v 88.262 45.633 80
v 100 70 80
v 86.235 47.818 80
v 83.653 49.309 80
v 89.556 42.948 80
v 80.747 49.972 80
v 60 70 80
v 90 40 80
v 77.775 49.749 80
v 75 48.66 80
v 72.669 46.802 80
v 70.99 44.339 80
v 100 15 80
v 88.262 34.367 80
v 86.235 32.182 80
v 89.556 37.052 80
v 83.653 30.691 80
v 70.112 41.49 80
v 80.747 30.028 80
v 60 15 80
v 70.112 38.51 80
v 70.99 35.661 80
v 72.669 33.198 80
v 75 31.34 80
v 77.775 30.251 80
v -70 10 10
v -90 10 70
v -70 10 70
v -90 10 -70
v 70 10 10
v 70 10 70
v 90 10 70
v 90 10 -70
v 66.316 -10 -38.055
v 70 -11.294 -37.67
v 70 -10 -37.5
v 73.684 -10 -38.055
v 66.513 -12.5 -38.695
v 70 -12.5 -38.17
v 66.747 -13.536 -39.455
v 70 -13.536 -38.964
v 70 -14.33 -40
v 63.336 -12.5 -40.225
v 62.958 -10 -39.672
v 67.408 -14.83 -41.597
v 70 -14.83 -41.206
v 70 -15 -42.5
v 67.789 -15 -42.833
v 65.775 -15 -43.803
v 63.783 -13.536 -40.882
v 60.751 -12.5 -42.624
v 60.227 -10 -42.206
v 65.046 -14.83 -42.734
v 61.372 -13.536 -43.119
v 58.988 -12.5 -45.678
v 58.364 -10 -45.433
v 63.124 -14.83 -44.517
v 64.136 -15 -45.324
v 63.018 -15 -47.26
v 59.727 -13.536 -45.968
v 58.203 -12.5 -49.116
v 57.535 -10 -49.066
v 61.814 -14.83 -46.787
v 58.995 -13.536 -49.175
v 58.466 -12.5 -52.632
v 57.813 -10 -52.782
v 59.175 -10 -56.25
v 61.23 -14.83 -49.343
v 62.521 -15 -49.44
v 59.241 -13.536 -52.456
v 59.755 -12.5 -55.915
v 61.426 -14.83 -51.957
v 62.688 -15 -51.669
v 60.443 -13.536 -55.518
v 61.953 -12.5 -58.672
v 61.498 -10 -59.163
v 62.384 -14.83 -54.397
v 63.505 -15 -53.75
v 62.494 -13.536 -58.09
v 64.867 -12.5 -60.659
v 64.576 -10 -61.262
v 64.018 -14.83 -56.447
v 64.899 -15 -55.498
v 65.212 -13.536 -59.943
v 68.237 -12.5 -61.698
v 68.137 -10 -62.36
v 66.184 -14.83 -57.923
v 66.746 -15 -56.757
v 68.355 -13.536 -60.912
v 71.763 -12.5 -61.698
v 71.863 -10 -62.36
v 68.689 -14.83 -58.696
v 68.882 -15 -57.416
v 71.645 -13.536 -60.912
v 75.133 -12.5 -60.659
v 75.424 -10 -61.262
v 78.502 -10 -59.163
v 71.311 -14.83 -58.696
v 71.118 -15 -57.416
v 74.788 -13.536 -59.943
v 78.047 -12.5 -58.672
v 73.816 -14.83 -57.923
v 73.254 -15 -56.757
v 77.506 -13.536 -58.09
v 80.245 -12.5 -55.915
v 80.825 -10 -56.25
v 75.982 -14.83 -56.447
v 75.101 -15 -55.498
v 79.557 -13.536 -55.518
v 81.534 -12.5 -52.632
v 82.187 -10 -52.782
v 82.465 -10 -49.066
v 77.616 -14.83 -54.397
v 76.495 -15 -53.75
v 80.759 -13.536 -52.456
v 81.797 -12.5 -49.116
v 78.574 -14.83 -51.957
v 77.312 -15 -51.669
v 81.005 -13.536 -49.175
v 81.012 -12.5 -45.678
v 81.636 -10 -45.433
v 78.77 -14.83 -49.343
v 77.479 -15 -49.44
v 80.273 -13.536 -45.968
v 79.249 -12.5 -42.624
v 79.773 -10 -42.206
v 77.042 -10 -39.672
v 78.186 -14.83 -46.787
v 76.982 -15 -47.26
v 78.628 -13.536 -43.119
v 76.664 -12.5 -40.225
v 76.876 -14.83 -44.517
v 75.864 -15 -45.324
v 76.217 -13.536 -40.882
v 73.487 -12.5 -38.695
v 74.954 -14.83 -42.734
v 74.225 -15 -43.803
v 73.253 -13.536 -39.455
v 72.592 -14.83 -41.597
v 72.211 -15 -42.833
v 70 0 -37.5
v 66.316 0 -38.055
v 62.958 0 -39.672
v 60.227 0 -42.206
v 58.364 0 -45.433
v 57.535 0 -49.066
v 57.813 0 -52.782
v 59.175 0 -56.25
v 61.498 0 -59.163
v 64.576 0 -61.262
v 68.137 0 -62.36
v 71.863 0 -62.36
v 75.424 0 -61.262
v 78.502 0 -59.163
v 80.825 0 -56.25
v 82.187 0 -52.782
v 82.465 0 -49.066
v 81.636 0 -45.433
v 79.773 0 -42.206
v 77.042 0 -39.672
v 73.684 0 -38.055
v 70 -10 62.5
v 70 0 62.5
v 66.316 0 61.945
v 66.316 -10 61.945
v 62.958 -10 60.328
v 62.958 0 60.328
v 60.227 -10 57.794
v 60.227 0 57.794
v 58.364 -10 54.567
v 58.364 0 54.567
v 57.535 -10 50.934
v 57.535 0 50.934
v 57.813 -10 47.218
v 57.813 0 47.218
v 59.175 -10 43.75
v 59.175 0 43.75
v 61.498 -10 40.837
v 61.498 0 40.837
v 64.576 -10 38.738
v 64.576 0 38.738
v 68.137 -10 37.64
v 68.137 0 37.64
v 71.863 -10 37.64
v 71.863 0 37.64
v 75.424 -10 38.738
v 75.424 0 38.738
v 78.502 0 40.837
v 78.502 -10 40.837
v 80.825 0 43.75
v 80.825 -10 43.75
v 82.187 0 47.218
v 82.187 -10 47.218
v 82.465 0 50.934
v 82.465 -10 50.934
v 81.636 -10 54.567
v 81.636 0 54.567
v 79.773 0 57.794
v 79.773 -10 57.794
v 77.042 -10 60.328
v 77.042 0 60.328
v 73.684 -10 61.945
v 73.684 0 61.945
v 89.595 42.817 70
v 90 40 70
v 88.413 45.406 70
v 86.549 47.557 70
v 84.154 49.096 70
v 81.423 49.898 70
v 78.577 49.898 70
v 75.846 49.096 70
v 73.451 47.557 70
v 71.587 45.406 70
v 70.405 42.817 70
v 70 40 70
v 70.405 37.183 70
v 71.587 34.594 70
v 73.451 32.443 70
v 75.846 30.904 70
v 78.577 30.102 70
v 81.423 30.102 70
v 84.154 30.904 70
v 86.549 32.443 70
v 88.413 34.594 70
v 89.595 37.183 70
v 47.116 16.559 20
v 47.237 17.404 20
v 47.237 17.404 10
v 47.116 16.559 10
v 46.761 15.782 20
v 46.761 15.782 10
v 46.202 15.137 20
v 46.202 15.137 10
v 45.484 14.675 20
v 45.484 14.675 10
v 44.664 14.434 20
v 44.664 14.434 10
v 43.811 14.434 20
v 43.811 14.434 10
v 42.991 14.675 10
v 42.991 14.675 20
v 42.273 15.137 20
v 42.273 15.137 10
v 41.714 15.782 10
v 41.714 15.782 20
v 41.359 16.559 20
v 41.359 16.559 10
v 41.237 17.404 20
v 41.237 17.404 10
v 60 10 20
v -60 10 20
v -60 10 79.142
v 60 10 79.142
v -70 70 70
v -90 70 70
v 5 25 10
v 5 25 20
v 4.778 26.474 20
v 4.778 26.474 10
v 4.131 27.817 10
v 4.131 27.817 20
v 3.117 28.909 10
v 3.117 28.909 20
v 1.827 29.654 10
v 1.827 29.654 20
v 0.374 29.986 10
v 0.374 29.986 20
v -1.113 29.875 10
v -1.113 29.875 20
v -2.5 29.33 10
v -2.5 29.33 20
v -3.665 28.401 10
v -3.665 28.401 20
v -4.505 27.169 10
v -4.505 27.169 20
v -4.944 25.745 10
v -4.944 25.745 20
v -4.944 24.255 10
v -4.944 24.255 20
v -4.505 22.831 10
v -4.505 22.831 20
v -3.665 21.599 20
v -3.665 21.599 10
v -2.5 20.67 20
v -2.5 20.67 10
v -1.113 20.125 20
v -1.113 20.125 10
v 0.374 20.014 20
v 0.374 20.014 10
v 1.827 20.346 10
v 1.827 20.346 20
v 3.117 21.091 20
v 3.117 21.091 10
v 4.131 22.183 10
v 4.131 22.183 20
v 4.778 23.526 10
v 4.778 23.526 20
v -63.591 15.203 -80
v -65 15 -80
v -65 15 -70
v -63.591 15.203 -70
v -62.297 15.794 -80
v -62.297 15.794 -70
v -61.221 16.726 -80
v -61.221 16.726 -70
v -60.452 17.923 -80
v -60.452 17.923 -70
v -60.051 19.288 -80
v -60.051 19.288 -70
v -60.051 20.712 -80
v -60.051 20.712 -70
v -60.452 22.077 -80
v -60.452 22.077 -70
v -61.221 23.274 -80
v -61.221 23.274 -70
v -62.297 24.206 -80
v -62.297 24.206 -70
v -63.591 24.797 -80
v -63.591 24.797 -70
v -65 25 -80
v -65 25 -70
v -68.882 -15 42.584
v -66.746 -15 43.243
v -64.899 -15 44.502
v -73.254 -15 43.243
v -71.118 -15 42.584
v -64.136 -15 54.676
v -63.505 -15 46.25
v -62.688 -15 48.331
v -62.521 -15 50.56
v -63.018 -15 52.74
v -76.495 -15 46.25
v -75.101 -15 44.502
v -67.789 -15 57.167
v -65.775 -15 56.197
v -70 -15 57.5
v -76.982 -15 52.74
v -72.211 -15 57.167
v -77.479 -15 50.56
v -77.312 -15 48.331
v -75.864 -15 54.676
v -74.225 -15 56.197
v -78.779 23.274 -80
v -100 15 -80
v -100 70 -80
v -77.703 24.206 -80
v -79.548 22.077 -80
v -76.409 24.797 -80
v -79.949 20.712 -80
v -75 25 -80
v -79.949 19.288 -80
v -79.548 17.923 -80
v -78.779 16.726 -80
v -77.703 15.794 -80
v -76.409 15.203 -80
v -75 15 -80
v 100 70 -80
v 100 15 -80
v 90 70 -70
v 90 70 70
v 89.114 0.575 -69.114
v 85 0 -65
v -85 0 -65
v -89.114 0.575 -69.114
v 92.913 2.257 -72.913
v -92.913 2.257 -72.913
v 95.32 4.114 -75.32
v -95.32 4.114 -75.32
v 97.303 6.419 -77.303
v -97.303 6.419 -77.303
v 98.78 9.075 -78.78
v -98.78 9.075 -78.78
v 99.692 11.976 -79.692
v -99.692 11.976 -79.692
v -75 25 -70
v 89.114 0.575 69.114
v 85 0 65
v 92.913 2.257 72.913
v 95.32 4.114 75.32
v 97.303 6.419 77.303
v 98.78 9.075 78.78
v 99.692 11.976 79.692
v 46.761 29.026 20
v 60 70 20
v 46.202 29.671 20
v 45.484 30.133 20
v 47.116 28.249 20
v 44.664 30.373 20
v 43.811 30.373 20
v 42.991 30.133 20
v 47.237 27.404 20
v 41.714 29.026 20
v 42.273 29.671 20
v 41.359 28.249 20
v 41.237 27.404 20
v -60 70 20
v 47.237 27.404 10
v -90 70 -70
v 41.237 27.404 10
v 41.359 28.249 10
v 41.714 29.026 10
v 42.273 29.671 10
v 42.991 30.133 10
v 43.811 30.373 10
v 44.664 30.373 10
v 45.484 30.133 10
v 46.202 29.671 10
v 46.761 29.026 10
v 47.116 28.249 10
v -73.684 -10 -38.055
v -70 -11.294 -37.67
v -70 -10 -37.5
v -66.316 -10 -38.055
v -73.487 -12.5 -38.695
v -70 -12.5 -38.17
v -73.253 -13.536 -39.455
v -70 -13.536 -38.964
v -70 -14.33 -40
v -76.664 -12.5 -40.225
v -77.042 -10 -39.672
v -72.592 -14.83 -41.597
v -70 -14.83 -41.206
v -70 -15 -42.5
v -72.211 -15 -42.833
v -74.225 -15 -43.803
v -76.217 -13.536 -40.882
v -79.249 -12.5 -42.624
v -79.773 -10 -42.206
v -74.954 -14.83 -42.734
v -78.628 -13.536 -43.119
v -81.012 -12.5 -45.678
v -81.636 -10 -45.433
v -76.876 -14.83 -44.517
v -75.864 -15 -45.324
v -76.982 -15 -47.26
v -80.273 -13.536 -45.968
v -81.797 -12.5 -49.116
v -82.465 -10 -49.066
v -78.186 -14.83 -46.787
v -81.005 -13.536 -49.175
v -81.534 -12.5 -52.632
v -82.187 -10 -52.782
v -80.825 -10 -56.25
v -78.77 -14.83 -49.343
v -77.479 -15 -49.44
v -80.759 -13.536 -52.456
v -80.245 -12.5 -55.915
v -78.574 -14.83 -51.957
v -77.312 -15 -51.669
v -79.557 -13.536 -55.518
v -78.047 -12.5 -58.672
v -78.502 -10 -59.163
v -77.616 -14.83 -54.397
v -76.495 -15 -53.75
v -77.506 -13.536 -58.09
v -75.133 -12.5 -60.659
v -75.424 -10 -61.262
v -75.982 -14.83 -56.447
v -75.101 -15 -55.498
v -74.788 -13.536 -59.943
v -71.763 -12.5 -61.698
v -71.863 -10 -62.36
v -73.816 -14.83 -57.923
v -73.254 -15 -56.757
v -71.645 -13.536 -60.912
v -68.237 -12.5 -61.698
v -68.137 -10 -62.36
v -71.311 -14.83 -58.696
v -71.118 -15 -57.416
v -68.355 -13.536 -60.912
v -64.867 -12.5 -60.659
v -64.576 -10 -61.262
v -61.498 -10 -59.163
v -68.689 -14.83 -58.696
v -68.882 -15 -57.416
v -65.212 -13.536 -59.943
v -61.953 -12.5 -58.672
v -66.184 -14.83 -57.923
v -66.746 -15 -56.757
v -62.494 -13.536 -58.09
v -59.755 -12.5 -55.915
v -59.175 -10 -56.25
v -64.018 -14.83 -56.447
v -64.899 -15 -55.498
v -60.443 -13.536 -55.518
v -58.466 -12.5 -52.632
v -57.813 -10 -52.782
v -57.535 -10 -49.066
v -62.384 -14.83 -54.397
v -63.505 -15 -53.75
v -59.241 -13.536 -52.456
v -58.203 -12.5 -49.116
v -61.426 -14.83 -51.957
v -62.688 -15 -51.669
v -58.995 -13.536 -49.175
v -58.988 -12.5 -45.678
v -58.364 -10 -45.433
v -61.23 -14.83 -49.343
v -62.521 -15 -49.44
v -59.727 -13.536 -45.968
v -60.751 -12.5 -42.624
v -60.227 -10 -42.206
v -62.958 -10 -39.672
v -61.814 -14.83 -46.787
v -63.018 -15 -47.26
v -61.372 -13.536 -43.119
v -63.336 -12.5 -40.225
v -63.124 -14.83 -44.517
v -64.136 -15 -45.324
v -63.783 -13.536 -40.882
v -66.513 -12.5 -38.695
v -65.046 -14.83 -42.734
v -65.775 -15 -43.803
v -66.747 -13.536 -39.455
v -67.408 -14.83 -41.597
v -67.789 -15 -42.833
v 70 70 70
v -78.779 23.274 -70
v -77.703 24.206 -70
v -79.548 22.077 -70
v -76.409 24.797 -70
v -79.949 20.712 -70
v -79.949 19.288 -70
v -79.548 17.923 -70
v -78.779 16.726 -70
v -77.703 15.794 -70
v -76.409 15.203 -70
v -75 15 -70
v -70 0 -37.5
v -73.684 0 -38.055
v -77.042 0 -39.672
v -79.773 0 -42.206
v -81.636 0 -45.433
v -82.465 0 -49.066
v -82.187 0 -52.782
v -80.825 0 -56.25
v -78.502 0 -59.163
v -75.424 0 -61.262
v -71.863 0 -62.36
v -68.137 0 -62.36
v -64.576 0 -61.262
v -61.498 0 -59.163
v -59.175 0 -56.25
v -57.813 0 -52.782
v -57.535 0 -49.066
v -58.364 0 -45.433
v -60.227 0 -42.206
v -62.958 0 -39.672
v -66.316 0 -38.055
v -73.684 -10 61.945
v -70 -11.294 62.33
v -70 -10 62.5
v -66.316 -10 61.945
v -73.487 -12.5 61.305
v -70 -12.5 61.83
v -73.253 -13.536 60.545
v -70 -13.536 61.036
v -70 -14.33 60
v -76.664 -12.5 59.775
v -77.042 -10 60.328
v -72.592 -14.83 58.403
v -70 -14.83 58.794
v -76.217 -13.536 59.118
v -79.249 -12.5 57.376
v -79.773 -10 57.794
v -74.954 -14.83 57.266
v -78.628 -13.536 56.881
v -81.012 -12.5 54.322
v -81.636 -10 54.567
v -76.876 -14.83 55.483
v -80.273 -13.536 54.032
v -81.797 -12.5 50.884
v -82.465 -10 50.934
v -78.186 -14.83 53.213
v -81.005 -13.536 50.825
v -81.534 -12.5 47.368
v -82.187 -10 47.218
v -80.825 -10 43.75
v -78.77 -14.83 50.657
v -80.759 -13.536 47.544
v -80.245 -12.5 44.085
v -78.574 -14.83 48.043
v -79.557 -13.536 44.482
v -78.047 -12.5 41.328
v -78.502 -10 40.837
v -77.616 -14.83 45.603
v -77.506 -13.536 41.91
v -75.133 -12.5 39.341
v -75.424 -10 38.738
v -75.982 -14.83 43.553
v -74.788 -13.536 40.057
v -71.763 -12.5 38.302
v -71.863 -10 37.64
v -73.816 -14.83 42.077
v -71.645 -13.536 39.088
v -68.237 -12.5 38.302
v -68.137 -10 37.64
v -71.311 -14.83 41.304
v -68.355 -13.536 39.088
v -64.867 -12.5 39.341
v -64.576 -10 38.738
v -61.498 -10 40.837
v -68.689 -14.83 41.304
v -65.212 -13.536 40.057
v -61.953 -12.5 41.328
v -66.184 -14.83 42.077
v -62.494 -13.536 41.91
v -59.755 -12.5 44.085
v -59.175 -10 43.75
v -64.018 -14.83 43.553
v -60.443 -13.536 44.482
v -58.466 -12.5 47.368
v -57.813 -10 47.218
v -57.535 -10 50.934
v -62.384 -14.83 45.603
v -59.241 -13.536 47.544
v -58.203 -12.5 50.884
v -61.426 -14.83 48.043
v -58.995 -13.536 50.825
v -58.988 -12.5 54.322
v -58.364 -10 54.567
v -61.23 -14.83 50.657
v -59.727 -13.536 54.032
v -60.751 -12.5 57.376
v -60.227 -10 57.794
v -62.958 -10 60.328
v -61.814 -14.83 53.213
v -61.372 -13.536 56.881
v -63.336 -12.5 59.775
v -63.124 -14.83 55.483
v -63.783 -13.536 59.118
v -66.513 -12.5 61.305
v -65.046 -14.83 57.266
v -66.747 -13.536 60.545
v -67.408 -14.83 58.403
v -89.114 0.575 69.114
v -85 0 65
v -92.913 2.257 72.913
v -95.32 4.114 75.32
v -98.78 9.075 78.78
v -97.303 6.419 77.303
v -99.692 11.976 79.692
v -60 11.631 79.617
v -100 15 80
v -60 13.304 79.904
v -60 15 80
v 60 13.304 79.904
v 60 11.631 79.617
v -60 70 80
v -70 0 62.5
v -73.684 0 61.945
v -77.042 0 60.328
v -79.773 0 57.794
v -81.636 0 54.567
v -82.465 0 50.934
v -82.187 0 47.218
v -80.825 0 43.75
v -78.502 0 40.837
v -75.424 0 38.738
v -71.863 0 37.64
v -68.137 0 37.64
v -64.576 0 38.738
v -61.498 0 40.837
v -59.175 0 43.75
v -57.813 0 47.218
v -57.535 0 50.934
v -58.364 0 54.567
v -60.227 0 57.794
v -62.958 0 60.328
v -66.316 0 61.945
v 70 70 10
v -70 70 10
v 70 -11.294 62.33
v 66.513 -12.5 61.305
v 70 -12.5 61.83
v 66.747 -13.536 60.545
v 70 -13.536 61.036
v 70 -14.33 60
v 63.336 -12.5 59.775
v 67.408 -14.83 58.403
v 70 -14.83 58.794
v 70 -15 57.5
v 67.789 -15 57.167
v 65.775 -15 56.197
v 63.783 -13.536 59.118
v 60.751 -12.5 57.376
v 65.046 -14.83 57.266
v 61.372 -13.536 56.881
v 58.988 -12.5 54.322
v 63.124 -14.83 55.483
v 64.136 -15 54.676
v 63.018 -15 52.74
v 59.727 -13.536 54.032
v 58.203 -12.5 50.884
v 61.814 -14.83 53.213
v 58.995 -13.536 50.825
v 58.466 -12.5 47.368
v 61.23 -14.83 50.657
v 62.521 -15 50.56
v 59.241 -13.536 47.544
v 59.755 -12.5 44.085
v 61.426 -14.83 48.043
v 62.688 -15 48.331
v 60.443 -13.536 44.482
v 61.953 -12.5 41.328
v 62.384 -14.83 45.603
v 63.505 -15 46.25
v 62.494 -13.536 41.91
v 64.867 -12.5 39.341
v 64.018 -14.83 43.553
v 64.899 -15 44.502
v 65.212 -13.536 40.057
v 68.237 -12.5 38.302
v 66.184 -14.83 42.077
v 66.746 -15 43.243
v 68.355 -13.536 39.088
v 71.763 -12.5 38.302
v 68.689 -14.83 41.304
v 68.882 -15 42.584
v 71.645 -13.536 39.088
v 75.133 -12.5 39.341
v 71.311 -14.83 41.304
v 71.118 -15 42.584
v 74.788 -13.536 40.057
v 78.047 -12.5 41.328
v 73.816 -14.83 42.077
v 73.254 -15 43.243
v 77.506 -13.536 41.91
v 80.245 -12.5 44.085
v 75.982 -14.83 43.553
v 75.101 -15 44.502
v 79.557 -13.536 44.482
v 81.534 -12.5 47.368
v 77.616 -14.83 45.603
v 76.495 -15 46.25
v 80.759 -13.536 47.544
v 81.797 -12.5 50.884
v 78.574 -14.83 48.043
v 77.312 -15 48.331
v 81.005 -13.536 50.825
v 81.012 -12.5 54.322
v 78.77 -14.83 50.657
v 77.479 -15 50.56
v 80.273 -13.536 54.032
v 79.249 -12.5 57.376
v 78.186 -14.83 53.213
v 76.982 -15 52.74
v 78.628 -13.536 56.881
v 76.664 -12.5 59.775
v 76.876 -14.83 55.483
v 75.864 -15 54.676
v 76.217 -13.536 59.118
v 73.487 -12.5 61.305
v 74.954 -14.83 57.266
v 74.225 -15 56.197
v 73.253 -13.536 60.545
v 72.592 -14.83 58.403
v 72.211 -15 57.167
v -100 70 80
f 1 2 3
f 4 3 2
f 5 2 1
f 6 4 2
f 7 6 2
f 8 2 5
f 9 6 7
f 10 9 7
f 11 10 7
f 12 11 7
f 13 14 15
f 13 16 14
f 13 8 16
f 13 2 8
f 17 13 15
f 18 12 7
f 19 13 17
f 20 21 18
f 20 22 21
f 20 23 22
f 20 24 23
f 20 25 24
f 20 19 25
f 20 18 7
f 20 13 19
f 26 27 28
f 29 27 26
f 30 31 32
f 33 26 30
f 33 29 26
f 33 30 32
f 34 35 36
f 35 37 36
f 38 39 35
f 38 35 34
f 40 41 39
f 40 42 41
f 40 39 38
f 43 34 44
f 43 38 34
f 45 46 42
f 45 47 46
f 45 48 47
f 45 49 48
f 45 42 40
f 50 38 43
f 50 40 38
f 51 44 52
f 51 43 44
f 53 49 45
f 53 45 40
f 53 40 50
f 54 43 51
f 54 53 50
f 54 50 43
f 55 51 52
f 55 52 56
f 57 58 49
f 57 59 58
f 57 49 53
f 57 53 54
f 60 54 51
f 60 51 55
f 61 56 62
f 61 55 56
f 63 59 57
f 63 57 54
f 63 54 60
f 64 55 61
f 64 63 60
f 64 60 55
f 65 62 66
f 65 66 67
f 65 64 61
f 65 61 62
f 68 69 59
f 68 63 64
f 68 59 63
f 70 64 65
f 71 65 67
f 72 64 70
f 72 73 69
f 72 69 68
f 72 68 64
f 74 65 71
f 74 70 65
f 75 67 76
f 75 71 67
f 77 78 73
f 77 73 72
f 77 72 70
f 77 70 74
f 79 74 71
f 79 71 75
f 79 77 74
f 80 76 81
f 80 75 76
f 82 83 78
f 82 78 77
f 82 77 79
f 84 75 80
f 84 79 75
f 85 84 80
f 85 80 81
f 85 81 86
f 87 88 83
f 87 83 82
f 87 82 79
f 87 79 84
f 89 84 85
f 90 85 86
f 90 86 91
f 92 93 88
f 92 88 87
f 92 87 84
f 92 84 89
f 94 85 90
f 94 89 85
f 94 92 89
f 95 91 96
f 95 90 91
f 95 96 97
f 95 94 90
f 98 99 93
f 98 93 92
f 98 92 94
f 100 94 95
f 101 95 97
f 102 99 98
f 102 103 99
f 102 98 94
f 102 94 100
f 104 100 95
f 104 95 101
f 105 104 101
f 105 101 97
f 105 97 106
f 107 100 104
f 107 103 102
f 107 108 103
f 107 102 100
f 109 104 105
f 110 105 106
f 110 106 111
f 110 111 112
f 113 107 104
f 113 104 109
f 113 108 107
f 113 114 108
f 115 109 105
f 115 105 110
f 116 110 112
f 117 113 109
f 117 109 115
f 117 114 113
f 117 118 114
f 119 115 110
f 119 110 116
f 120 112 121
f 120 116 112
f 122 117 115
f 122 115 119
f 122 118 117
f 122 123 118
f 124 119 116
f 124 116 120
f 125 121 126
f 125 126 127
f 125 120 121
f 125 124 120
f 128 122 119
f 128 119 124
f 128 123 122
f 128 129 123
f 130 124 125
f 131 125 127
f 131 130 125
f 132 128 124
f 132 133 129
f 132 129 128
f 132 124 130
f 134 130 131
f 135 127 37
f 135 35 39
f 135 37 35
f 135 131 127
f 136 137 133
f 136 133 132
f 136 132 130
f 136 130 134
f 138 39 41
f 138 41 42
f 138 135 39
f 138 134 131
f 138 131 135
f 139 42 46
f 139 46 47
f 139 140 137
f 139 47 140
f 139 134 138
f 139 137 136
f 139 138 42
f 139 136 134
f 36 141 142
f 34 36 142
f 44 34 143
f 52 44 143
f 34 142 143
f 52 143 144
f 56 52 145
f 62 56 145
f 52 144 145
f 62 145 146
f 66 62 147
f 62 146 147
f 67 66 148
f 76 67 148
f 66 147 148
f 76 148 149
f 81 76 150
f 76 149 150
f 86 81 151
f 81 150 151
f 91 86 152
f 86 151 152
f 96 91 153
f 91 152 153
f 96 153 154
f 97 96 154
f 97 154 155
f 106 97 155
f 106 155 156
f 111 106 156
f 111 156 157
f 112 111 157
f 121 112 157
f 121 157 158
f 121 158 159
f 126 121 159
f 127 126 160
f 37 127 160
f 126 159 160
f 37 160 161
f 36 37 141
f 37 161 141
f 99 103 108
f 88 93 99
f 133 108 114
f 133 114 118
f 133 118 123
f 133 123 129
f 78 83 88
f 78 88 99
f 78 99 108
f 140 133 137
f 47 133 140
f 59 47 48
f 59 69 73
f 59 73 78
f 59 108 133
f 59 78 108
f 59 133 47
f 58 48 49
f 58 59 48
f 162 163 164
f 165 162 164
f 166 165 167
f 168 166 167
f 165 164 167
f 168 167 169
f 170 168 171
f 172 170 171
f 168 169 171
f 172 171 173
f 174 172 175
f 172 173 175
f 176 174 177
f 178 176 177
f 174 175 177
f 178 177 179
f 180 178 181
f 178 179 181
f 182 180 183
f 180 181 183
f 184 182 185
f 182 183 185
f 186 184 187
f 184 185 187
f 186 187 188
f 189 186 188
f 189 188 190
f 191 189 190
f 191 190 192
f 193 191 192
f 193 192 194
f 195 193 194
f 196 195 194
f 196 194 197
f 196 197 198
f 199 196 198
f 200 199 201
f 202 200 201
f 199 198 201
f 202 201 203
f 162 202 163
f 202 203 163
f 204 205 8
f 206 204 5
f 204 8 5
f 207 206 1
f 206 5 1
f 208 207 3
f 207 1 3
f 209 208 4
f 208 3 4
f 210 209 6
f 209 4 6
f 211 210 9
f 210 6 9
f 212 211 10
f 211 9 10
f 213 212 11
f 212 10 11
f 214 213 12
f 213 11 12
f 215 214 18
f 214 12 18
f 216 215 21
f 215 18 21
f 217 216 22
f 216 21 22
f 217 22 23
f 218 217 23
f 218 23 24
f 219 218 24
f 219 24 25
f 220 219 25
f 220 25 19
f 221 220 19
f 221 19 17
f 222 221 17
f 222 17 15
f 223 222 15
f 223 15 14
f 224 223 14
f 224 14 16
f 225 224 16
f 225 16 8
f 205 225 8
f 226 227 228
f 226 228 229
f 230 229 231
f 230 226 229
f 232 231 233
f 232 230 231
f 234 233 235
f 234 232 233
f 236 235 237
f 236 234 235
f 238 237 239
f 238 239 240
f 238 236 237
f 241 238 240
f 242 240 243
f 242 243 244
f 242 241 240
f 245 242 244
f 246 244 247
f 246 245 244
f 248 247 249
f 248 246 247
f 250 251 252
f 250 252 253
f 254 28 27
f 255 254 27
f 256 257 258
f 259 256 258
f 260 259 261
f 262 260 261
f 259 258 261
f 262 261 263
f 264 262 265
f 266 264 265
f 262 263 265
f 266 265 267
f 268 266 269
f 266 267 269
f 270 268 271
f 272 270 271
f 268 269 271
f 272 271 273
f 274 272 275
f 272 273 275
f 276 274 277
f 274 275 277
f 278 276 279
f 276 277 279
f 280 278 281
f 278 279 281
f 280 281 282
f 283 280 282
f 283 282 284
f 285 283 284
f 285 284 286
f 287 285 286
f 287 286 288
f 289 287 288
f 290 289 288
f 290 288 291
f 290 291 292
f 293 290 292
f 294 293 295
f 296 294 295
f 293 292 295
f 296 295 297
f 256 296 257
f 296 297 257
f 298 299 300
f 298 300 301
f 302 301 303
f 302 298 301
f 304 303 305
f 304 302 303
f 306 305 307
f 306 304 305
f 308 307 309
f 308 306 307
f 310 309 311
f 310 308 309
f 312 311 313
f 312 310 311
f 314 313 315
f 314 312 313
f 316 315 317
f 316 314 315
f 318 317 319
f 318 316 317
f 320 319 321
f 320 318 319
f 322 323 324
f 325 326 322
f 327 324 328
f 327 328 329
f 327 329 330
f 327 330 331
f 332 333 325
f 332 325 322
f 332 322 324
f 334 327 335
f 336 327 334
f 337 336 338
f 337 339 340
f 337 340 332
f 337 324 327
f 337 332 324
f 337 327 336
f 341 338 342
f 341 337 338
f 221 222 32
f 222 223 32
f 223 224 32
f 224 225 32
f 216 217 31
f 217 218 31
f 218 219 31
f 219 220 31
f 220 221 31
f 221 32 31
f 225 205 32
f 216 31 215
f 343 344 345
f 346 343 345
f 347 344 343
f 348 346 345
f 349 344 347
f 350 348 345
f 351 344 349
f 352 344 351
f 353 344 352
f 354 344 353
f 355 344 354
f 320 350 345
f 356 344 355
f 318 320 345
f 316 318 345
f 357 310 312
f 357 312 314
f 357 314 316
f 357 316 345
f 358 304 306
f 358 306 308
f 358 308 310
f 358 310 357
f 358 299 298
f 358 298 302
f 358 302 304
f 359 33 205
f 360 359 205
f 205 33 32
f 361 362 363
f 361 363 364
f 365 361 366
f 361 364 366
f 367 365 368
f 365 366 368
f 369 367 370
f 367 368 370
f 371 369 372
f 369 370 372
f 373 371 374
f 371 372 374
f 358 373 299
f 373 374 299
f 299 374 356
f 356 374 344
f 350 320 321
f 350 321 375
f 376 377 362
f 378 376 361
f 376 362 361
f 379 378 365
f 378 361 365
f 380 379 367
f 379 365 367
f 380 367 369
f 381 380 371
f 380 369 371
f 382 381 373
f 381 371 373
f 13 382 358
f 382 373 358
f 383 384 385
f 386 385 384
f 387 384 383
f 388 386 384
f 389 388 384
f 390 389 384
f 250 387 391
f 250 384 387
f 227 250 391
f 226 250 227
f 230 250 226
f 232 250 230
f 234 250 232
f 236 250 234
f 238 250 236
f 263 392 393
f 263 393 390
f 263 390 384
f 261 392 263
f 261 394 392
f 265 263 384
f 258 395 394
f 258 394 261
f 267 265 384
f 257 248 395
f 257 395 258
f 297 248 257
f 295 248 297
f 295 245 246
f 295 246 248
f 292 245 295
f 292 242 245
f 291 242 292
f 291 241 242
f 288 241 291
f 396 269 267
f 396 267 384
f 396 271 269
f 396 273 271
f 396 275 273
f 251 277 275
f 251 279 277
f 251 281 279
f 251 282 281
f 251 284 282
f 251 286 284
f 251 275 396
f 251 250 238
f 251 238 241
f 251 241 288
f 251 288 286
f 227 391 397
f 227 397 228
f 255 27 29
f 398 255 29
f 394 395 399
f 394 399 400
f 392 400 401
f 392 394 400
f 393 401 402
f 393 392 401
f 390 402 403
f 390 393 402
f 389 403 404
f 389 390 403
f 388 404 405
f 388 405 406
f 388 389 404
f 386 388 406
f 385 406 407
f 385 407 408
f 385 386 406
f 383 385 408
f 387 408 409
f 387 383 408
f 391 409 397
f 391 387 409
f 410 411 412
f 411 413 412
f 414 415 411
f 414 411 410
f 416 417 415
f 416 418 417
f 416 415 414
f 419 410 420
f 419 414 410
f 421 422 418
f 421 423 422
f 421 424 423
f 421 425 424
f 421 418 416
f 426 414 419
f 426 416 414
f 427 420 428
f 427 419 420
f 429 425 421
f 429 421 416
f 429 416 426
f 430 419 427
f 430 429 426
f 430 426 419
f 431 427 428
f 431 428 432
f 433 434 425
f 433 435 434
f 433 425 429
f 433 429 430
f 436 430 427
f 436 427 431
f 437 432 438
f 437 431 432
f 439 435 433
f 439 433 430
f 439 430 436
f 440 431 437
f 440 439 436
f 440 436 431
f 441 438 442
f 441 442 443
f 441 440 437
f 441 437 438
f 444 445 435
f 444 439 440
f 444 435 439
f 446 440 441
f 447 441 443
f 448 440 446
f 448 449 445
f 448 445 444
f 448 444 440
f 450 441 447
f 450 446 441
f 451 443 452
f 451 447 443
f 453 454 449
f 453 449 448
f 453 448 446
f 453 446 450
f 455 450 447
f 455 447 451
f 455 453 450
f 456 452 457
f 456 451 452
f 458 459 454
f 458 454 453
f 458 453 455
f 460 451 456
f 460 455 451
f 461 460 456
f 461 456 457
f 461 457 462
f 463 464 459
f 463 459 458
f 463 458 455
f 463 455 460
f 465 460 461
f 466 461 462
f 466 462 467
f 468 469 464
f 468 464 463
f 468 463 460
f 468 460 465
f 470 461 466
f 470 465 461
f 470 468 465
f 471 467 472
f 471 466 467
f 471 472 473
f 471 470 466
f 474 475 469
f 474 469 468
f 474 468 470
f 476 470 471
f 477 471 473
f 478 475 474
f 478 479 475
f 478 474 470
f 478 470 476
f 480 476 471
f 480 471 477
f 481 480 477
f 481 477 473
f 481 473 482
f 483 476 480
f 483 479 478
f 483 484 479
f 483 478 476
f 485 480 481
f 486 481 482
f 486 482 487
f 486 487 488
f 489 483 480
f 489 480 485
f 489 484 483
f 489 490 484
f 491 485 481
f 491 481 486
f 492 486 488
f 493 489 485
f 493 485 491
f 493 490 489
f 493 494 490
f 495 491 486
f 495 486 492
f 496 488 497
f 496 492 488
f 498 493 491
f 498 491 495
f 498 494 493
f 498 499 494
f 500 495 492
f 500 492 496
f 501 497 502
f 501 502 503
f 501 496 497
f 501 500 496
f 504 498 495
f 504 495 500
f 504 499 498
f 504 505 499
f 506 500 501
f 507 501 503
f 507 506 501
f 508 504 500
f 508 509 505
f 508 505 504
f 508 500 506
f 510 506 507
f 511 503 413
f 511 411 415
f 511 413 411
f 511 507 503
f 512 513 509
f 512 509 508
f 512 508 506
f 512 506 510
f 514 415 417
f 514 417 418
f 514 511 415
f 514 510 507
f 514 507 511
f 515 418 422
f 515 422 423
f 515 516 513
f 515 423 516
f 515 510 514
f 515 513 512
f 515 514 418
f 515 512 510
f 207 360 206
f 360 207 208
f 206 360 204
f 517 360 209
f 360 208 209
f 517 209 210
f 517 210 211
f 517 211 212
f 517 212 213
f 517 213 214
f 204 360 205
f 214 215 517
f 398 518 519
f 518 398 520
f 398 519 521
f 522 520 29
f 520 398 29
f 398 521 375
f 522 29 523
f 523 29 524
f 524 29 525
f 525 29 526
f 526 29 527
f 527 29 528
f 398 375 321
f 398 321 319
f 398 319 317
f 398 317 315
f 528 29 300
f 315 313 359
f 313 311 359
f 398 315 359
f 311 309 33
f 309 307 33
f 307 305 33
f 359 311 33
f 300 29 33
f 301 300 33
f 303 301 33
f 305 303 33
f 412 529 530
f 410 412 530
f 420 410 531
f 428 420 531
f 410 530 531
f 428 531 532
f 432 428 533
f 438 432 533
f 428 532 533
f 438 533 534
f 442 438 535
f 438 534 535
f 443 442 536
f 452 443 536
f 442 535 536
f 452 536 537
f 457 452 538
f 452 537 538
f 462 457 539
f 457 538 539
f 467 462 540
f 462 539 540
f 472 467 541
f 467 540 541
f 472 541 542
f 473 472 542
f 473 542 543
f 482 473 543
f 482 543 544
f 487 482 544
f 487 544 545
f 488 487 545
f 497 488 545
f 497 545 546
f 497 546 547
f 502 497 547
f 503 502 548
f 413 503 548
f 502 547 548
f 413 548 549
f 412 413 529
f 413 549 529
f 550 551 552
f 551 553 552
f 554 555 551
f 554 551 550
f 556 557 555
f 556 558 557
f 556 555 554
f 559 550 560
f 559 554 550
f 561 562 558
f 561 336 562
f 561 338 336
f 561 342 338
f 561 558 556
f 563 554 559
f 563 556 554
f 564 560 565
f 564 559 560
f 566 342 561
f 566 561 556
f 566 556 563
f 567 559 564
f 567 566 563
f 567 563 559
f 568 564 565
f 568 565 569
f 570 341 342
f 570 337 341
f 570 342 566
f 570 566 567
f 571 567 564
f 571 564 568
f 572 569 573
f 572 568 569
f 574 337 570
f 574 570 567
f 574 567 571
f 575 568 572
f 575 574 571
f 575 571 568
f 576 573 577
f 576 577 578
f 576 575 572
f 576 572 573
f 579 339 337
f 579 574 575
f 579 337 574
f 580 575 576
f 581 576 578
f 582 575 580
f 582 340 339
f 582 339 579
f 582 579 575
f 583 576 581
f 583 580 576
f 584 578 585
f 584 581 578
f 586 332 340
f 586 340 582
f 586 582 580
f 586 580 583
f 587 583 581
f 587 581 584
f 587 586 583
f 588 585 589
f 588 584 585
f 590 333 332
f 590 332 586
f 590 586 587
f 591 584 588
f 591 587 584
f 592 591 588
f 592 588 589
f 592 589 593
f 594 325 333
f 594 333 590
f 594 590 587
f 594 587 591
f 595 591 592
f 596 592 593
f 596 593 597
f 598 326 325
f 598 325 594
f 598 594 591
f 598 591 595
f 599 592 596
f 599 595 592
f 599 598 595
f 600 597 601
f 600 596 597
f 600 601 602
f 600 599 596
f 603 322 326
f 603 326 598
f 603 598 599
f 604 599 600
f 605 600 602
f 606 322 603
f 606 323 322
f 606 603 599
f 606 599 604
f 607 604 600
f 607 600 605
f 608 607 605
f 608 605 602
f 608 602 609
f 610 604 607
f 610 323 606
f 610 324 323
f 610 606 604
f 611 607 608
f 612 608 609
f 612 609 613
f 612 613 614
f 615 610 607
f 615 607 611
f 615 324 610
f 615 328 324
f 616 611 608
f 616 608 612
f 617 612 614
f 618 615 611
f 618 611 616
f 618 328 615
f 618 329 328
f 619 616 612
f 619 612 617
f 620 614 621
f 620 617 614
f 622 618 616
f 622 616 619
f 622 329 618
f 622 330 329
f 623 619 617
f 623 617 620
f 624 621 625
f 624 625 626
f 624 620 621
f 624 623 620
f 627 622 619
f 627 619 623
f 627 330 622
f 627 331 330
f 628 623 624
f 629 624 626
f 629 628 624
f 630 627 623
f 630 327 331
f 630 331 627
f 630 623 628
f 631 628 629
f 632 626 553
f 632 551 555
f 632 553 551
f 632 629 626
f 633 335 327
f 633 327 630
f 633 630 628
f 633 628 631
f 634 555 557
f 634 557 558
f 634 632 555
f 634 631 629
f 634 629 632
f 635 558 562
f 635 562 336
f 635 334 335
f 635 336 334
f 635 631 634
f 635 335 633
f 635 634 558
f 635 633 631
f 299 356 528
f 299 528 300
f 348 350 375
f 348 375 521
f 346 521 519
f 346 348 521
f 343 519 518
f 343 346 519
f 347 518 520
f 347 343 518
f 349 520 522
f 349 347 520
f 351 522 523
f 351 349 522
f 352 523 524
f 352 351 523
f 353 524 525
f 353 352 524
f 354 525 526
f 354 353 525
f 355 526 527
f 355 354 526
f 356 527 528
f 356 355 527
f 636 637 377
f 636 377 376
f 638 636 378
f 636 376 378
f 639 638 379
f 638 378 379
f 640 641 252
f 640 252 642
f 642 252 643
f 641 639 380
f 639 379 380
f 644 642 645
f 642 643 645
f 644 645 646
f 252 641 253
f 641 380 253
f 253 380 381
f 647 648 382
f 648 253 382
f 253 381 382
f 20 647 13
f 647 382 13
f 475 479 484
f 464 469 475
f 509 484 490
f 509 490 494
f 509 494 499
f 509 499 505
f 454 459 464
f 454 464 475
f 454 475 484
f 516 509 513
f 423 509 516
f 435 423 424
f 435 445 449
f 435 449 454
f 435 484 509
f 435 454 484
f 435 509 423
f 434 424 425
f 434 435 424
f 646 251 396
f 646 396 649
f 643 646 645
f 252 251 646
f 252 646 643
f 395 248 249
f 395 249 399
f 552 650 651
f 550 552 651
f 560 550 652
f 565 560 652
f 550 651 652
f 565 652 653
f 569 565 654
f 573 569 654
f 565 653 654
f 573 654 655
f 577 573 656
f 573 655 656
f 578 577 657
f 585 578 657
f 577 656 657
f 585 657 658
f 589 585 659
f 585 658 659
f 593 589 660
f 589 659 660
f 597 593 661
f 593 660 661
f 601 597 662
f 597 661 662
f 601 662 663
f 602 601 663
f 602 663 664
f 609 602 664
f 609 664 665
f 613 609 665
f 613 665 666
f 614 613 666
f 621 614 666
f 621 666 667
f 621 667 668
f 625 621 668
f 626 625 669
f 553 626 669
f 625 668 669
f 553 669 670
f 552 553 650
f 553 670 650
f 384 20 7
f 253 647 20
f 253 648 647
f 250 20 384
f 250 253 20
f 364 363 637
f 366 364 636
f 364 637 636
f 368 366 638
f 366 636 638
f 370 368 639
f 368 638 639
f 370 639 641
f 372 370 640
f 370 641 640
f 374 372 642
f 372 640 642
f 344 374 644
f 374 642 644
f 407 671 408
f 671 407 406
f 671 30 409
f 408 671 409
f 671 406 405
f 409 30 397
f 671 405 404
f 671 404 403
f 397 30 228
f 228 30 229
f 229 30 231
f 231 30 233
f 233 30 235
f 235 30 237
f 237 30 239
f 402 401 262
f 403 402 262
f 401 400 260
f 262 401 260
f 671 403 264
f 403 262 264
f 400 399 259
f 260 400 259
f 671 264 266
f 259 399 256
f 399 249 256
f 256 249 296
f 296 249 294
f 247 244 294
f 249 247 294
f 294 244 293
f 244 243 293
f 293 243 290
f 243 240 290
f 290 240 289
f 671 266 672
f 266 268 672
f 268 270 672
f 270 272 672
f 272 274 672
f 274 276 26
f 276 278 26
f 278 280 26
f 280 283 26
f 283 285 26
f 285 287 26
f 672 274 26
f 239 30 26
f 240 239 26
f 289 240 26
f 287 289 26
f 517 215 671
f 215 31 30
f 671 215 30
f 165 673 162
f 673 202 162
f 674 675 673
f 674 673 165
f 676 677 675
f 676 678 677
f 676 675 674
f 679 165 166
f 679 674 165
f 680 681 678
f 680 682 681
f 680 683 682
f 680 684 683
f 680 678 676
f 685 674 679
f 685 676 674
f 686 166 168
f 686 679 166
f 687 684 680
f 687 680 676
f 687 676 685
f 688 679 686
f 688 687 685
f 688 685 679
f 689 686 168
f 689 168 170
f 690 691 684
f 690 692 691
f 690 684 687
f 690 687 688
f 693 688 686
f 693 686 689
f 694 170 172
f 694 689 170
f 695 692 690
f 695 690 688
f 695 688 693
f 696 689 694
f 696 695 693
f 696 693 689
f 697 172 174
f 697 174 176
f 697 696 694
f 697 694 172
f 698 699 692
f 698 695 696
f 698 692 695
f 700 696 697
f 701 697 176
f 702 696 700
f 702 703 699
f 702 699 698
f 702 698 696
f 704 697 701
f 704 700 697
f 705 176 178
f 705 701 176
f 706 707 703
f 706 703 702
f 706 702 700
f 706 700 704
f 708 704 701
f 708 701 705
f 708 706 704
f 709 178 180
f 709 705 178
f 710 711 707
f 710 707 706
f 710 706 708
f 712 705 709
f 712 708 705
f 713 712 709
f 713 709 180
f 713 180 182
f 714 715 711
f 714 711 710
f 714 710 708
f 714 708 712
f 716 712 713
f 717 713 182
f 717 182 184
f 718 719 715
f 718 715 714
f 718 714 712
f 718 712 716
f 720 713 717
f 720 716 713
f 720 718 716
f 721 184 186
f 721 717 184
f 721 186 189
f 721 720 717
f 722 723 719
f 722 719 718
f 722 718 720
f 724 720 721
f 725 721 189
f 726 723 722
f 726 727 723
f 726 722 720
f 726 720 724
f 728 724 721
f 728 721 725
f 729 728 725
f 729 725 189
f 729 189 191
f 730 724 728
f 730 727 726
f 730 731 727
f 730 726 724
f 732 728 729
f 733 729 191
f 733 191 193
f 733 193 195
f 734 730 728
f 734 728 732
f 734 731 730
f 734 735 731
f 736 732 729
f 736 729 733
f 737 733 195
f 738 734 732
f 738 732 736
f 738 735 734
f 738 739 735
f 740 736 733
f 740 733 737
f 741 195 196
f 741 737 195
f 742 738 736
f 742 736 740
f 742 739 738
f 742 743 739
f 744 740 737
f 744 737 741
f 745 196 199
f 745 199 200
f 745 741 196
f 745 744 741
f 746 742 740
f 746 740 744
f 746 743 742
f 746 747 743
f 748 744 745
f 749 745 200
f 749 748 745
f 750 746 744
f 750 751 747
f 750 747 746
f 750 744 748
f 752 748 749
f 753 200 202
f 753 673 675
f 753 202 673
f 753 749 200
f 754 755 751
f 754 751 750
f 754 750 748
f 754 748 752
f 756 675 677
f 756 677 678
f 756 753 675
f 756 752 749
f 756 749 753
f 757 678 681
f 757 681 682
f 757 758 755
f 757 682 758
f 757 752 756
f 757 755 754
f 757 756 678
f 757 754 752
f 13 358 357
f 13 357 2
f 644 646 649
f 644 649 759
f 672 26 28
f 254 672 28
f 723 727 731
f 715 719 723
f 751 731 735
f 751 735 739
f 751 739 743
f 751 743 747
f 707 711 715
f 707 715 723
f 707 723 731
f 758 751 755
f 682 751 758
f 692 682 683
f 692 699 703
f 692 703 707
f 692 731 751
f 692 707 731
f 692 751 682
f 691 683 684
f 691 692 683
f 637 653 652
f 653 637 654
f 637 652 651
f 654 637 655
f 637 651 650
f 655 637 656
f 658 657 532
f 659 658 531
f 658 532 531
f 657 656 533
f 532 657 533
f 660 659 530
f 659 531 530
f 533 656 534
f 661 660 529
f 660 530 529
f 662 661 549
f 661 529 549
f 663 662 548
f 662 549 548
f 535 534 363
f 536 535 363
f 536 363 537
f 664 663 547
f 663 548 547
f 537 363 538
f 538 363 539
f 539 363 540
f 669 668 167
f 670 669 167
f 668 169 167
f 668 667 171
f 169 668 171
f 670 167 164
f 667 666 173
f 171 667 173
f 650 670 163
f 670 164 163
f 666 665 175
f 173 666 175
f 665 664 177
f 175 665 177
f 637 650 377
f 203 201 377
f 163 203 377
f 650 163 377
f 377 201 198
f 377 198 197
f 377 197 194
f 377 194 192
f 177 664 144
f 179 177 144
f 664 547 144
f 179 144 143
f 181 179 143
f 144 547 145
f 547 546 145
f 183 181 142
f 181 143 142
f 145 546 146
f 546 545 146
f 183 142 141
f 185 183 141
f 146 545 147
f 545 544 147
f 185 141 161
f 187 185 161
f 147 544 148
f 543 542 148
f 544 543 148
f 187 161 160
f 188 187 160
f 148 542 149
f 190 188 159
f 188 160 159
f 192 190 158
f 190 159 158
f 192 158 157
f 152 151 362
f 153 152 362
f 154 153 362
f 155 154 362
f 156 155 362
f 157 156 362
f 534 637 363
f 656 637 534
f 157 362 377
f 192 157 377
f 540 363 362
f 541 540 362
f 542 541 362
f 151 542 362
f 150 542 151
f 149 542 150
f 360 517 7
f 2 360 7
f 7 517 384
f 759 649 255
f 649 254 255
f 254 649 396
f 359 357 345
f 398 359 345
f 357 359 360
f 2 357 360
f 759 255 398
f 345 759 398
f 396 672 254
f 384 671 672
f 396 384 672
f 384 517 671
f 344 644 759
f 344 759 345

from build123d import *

# Parameters (mm, degrees)
SKETCH2_W           = 200
SKETCH2_H           = 160
BOSS_EXTRUDE1_DEPTH = 10
BOSS_EXTRUDE2_DEPTH = 60
SKETCH8_R           = 12.5
BOSS_EXTRUDE6_DEPTH = 15
FILLET2_R           = 5
CUT_EXTRUDE4_DEPTH  = 15
SKETCH10_R          = 10
CUT_EXTRUDE5_DEPTH  = 10
SKETCH7_R           = 5
CUT_EXTRUDE6_DEPTH  = 10
CUT_EXTRUDE7_DEPTH  = 10
FILLET5_R           = 15


with BuildPart() as part:
    # Sketch2 → Boss-Extrude1 (new body)
    with BuildSketch(Plane(origin=(0, 0, 0), x_dir=(1, 0, 0), z_dir=(0, 1, 0))):
        Rectangle(SKETCH2_W, SKETCH2_H)
    extrude(amount=BOSS_EXTRUDE1_DEPTH)

    # Sketch3 → Boss-Extrude2 (add)
    with BuildSketch(Plane(origin=(0, 10, 0), x_dir=(1, 0, 0), z_dir=(0, 1, 0))):
        Polygon((-100, 80), (100, 80), (100, -80), (60, -80), (60, -20), (-60, -20), (-60, -80), (-100, -80), align=None)
        Polygon((90, 70), (90, -70), (70, -70), (70, -10), (-70, -10), (-70, -70), (-90, -70), (-90, 70), align=None, mode=Mode.SUBTRACT)
    extrude(amount=BOSS_EXTRUDE2_DEPTH)

    # Sketch8 → Boss-Extrude6 (add)
    with BuildSketch(Plane.XZ):
        with Locations(Location((70, 50, 0), (0, 0, 90))):
            Circle(SKETCH8_R)
        with Locations(Location((-70, 50, 0), (0, 0, 90))):
            Circle(SKETCH8_R)
        with Locations(Location((70, -50, 0), (0, 0, 90))):
            Circle(SKETCH8_R)
        with Locations(Location((-70, -50, 0), (0, 0, 90))):
            Circle(SKETCH8_R)
    extrude(amount=BOSS_EXTRUDE6_DEPTH)

    # Fillet2
    fillet2_edges = [part.edges().sort_by_distance(p)[0] for p in [
        (70, -15, 37.5),
        (-70, -15, 37.5),
        (70, -15, -62.5),
        (-70, -15, -62.5),
    ]]
    fillet(fillet2_edges, radius=FILLET2_R)

    # Sketch9 → Cut-Extrude4 (cut)
    with BuildSketch(Plane(origin=(0, 0, -80), x_dir=(-1, 0, 0), z_dir=(0, 0, -1))):
        with BuildLine():
            Line((65, 25), (75, 25))
            ThreePointArc((75, 25), (80, 20), (75, 15))
            Line((75, 15), (65, 15))
            ThreePointArc((65, 15), (60, 20), (65, 25))
        make_face()
    extrude(amount=-CUT_EXTRUDE4_DEPTH, mode=Mode.SUBTRACT)

    # Sketch10 → Cut-Extrude5 (cut)
    with BuildSketch(Plane.XY.offset(80)):
        with Locations((80, 40)):
            Circle(SKETCH10_R)
    extrude(amount=-CUT_EXTRUDE5_DEPTH, mode=Mode.SUBTRACT)

    # Sketch7 → Cut-Extrude6 (cut)
    with BuildSketch(Plane.XY.offset(20)):
        with Locations((0, 25)):
            Circle(SKETCH7_R)
    extrude(amount=-CUT_EXTRUDE6_DEPTH, mode=Mode.SUBTRACT)

    # Sketch11 → Cut-Extrude7 (cut)
    with BuildSketch(Plane.XY.offset(20)):
        with BuildLine():
            Line((47.237449464, 27.403784995), (47.237449464, 17.403784995))
            ThreePointArc((47.237449464, 17.403784995), (44.237449464, 14.403784995), (41.237449464, 17.403784995))
            Line((41.237449464, 17.403784995), (41.237449464, 27.403784995))
            ThreePointArc((41.237449464, 27.403784995), (44.237449464, 30.403784995), (47.237449464, 27.403784995))
        make_face()
    extrude(amount=-CUT_EXTRUDE7_DEPTH, mode=Mode.SUBTRACT)

    # Fillet5
    # the kernel refuses this fillet: 15 mm, written as the material it takes off along each edge
    with BuildSketch(Plane(origin=(-137.5, 0, -80), x_dir=(0, 0, 1), z_dir=(1, 0, 0)), Plane(origin=(137.5, 0, 80), x_dir=(0, 0, -1), z_dir=(-1, 0, 0))) as fillet5_piece_1:
        with BuildLine():
            CenterArc((FILLET5_R, -FILLET5_R), FILLET5_R, 90, 90)
            Line((0, -FILLET5_R), (0, 0))
            Line((0, 0), (FILLET5_R, 0))
        make_face()
    extrude(amount=275, mode=Mode.SUBTRACT)
    with BuildSketch(Plane(origin=(100, 0, -117.5), x_dir=(-1, 0, 0), z_dir=(0, 0, 1)), Plane(origin=(-100, 0, 117.5), x_dir=(1, 0, 0), z_dir=(0, 0, -1))) as fillet5_piece_2:
        with BuildLine():
            CenterArc((FILLET5_R, -FILLET5_R), FILLET5_R, 90, 90)
            Line((0, -FILLET5_R), (0, 0))
            Line((0, 0), (FILLET5_R, 0))
        make_face()
    extrude(amount=235, mode=Mode.SUBTRACT)


solid = part.part
